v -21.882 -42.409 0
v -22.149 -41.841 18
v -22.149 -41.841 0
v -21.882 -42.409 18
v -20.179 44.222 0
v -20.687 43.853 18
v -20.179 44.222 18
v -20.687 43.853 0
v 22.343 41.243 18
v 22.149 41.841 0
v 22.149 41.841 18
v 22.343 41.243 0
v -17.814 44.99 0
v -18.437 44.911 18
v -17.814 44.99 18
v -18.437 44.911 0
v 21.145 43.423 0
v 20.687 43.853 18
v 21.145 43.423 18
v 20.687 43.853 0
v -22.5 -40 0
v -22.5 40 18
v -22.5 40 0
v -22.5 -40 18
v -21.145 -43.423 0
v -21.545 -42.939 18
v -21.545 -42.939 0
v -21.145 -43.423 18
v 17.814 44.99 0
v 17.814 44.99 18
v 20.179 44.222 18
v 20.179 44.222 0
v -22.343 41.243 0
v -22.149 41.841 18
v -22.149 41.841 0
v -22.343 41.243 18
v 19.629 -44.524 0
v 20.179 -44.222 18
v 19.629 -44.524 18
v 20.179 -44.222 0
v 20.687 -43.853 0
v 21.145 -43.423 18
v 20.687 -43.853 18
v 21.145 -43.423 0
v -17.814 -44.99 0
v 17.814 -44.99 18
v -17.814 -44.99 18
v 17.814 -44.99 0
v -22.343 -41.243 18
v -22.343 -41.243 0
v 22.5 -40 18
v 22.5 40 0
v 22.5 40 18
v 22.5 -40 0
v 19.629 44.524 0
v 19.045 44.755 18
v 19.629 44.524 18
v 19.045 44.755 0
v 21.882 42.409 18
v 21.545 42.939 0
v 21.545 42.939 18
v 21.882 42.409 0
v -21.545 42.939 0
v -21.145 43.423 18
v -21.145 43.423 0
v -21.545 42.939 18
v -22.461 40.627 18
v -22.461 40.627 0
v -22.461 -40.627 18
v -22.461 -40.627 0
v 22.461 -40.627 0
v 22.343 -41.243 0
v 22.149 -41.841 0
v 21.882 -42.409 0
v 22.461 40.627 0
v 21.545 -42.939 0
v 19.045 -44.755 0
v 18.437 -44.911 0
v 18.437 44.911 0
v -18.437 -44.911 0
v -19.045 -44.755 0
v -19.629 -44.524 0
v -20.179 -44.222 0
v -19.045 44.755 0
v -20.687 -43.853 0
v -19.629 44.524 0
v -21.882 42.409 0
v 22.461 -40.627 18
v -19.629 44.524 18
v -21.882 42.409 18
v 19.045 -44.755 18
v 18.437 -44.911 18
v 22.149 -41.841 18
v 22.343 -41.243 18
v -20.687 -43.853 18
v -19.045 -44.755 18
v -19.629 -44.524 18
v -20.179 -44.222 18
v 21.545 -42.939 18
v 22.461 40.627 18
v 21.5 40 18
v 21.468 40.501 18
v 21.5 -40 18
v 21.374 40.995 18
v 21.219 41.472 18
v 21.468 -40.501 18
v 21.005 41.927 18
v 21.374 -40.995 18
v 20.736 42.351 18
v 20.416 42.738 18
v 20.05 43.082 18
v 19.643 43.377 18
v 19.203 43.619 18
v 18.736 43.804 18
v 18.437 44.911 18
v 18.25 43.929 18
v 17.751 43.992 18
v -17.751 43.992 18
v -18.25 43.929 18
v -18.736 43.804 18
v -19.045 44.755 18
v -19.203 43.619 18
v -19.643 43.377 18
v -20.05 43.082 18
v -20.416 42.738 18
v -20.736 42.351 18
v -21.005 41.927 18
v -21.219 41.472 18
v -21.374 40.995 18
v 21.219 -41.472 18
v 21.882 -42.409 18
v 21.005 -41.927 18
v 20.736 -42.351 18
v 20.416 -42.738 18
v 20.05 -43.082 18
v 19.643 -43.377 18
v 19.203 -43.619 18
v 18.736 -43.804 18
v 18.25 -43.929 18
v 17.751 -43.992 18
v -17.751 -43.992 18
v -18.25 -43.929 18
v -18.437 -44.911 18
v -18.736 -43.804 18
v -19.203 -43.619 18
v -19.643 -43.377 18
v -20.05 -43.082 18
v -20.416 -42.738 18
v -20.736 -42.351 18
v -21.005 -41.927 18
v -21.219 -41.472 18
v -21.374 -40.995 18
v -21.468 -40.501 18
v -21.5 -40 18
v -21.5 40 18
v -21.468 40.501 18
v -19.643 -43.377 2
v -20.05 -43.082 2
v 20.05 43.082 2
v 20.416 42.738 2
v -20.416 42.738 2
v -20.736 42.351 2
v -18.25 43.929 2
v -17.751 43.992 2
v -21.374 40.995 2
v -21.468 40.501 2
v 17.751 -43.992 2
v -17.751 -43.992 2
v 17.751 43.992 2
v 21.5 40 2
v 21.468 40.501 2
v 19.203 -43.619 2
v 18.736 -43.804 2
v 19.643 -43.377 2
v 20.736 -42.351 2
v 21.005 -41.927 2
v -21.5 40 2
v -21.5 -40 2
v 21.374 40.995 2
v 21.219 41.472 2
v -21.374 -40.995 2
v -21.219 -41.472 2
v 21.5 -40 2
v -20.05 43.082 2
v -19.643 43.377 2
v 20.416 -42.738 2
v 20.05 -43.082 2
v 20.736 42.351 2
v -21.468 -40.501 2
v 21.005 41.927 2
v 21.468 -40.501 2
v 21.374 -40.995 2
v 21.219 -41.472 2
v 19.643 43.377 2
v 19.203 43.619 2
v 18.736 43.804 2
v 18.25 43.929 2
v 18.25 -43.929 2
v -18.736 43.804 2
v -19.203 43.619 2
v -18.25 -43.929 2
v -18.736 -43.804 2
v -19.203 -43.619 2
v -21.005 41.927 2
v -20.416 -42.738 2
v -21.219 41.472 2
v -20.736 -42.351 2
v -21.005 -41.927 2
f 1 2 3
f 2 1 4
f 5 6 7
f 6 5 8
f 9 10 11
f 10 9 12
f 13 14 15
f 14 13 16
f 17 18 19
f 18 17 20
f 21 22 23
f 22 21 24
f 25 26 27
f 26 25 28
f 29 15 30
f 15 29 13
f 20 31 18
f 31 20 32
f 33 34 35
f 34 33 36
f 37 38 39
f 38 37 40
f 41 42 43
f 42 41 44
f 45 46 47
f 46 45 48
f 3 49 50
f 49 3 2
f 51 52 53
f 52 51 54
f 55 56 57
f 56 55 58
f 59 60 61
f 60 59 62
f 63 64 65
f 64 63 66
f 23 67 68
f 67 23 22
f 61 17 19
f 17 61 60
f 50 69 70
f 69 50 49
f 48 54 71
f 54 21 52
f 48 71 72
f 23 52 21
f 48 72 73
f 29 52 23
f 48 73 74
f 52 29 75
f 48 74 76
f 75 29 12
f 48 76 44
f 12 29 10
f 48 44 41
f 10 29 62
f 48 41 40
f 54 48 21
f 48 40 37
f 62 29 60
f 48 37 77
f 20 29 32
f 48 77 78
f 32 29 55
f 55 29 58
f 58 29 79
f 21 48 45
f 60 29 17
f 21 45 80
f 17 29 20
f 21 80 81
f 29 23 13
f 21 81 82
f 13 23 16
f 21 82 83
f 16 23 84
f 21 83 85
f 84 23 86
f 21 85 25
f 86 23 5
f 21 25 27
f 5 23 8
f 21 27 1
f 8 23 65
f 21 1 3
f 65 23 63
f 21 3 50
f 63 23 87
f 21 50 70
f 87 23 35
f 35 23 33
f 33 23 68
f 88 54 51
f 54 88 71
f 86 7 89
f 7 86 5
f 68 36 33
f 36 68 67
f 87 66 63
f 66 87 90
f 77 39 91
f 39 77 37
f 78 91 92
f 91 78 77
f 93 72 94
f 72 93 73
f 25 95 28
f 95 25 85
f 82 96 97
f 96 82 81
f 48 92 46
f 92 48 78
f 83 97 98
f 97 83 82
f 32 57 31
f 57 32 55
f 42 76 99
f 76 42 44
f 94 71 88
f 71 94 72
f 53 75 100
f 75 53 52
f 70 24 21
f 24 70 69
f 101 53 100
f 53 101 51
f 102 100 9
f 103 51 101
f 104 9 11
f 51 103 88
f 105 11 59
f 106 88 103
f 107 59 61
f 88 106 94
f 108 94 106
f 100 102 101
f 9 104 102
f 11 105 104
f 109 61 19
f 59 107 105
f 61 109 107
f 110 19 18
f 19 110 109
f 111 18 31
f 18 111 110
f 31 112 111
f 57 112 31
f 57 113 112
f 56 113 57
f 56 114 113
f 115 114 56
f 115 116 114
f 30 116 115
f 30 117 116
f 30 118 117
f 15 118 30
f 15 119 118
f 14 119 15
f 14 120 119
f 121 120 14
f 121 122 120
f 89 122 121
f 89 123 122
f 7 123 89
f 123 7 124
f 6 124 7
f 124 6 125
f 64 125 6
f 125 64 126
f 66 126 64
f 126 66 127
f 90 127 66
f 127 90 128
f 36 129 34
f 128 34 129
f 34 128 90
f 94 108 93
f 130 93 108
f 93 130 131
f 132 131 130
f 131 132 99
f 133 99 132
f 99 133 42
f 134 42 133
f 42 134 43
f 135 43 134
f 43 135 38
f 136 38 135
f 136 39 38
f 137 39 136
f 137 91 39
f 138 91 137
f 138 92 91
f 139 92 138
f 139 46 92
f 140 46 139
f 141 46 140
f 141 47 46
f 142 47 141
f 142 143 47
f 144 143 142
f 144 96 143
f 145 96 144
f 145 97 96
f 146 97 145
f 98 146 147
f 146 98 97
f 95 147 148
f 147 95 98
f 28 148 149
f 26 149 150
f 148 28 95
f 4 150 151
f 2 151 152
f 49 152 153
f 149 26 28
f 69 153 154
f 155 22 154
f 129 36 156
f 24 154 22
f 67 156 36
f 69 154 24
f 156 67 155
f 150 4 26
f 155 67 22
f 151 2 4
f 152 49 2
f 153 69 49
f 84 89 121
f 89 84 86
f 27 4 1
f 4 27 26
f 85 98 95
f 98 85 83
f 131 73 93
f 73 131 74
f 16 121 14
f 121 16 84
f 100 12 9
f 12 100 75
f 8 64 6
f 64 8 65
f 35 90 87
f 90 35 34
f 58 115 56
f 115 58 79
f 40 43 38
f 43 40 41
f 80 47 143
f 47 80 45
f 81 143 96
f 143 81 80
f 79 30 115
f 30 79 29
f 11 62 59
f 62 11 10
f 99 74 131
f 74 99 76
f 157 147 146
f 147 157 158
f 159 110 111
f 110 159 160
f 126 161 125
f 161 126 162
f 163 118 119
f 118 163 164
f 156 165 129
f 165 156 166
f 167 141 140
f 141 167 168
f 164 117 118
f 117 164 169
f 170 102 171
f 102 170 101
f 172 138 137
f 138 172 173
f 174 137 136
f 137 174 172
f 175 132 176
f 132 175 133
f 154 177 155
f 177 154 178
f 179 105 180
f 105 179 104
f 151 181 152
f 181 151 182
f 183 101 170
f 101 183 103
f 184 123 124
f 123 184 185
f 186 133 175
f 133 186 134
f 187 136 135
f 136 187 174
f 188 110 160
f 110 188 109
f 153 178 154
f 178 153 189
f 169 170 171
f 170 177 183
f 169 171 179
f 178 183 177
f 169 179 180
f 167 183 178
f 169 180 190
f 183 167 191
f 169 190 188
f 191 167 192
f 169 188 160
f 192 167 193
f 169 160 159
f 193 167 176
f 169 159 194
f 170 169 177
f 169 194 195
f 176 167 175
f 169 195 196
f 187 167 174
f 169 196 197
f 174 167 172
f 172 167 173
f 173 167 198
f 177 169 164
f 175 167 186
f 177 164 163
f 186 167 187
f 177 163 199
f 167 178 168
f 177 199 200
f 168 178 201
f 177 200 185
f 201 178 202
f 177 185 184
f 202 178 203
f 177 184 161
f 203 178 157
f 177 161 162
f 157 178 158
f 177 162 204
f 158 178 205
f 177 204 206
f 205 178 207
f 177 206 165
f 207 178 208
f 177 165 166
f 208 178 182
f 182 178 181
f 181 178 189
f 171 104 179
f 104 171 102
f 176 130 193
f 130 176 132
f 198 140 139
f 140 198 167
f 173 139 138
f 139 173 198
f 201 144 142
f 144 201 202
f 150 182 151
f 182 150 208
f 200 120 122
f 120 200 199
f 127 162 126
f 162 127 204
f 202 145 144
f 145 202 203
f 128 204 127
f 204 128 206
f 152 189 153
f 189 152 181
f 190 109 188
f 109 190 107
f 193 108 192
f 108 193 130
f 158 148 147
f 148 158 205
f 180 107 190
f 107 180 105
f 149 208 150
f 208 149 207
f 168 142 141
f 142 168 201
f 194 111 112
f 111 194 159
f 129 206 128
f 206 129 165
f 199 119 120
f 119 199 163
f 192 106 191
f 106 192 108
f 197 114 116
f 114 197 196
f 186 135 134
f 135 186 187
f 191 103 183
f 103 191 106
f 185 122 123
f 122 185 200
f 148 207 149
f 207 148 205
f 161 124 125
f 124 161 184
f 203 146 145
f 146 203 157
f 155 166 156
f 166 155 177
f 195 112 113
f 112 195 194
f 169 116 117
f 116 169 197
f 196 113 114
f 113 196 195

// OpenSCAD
$fn = 50;


difference() {
	union() {
		hull() {
			translate(v = [-17.5000000000, 40.0000000000, 0]) {
				cylinder(h = 18, r = 5);
			}
			translate(v = [17.5000000000, 40.0000000000, 0]) {
				cylinder(h = 18, r = 5);
			}
			translate(v = [-17.5000000000, -40.0000000000, 0]) {
				cylinder(h = 18, r = 5);
			}
			translate(v = [17.5000000000, -40.0000000000, 0]) {
				cylinder(h = 18, r = 5);
			}
		}
	}
	union() {
		translate(v = [0, 0, 2]) {
			hull() {
				translate(v = [-17.5000000000, 40.0000000000, 0]) {
					cylinder(h = 16, r = 4);
				}
				translate(v = [17.5000000000, 40.0000000000, 0]) {
					cylinder(h = 16, r = 4);
				}
				translate(v = [-17.5000000000, -40.0000000000, 0]) {
					cylinder(h = 16, r = 4);
				}
				translate(v = [17.5000000000, -40.0000000000, 0]) {
					cylinder(h = 16, r = 4);
				}
			}
		}
	}
}
